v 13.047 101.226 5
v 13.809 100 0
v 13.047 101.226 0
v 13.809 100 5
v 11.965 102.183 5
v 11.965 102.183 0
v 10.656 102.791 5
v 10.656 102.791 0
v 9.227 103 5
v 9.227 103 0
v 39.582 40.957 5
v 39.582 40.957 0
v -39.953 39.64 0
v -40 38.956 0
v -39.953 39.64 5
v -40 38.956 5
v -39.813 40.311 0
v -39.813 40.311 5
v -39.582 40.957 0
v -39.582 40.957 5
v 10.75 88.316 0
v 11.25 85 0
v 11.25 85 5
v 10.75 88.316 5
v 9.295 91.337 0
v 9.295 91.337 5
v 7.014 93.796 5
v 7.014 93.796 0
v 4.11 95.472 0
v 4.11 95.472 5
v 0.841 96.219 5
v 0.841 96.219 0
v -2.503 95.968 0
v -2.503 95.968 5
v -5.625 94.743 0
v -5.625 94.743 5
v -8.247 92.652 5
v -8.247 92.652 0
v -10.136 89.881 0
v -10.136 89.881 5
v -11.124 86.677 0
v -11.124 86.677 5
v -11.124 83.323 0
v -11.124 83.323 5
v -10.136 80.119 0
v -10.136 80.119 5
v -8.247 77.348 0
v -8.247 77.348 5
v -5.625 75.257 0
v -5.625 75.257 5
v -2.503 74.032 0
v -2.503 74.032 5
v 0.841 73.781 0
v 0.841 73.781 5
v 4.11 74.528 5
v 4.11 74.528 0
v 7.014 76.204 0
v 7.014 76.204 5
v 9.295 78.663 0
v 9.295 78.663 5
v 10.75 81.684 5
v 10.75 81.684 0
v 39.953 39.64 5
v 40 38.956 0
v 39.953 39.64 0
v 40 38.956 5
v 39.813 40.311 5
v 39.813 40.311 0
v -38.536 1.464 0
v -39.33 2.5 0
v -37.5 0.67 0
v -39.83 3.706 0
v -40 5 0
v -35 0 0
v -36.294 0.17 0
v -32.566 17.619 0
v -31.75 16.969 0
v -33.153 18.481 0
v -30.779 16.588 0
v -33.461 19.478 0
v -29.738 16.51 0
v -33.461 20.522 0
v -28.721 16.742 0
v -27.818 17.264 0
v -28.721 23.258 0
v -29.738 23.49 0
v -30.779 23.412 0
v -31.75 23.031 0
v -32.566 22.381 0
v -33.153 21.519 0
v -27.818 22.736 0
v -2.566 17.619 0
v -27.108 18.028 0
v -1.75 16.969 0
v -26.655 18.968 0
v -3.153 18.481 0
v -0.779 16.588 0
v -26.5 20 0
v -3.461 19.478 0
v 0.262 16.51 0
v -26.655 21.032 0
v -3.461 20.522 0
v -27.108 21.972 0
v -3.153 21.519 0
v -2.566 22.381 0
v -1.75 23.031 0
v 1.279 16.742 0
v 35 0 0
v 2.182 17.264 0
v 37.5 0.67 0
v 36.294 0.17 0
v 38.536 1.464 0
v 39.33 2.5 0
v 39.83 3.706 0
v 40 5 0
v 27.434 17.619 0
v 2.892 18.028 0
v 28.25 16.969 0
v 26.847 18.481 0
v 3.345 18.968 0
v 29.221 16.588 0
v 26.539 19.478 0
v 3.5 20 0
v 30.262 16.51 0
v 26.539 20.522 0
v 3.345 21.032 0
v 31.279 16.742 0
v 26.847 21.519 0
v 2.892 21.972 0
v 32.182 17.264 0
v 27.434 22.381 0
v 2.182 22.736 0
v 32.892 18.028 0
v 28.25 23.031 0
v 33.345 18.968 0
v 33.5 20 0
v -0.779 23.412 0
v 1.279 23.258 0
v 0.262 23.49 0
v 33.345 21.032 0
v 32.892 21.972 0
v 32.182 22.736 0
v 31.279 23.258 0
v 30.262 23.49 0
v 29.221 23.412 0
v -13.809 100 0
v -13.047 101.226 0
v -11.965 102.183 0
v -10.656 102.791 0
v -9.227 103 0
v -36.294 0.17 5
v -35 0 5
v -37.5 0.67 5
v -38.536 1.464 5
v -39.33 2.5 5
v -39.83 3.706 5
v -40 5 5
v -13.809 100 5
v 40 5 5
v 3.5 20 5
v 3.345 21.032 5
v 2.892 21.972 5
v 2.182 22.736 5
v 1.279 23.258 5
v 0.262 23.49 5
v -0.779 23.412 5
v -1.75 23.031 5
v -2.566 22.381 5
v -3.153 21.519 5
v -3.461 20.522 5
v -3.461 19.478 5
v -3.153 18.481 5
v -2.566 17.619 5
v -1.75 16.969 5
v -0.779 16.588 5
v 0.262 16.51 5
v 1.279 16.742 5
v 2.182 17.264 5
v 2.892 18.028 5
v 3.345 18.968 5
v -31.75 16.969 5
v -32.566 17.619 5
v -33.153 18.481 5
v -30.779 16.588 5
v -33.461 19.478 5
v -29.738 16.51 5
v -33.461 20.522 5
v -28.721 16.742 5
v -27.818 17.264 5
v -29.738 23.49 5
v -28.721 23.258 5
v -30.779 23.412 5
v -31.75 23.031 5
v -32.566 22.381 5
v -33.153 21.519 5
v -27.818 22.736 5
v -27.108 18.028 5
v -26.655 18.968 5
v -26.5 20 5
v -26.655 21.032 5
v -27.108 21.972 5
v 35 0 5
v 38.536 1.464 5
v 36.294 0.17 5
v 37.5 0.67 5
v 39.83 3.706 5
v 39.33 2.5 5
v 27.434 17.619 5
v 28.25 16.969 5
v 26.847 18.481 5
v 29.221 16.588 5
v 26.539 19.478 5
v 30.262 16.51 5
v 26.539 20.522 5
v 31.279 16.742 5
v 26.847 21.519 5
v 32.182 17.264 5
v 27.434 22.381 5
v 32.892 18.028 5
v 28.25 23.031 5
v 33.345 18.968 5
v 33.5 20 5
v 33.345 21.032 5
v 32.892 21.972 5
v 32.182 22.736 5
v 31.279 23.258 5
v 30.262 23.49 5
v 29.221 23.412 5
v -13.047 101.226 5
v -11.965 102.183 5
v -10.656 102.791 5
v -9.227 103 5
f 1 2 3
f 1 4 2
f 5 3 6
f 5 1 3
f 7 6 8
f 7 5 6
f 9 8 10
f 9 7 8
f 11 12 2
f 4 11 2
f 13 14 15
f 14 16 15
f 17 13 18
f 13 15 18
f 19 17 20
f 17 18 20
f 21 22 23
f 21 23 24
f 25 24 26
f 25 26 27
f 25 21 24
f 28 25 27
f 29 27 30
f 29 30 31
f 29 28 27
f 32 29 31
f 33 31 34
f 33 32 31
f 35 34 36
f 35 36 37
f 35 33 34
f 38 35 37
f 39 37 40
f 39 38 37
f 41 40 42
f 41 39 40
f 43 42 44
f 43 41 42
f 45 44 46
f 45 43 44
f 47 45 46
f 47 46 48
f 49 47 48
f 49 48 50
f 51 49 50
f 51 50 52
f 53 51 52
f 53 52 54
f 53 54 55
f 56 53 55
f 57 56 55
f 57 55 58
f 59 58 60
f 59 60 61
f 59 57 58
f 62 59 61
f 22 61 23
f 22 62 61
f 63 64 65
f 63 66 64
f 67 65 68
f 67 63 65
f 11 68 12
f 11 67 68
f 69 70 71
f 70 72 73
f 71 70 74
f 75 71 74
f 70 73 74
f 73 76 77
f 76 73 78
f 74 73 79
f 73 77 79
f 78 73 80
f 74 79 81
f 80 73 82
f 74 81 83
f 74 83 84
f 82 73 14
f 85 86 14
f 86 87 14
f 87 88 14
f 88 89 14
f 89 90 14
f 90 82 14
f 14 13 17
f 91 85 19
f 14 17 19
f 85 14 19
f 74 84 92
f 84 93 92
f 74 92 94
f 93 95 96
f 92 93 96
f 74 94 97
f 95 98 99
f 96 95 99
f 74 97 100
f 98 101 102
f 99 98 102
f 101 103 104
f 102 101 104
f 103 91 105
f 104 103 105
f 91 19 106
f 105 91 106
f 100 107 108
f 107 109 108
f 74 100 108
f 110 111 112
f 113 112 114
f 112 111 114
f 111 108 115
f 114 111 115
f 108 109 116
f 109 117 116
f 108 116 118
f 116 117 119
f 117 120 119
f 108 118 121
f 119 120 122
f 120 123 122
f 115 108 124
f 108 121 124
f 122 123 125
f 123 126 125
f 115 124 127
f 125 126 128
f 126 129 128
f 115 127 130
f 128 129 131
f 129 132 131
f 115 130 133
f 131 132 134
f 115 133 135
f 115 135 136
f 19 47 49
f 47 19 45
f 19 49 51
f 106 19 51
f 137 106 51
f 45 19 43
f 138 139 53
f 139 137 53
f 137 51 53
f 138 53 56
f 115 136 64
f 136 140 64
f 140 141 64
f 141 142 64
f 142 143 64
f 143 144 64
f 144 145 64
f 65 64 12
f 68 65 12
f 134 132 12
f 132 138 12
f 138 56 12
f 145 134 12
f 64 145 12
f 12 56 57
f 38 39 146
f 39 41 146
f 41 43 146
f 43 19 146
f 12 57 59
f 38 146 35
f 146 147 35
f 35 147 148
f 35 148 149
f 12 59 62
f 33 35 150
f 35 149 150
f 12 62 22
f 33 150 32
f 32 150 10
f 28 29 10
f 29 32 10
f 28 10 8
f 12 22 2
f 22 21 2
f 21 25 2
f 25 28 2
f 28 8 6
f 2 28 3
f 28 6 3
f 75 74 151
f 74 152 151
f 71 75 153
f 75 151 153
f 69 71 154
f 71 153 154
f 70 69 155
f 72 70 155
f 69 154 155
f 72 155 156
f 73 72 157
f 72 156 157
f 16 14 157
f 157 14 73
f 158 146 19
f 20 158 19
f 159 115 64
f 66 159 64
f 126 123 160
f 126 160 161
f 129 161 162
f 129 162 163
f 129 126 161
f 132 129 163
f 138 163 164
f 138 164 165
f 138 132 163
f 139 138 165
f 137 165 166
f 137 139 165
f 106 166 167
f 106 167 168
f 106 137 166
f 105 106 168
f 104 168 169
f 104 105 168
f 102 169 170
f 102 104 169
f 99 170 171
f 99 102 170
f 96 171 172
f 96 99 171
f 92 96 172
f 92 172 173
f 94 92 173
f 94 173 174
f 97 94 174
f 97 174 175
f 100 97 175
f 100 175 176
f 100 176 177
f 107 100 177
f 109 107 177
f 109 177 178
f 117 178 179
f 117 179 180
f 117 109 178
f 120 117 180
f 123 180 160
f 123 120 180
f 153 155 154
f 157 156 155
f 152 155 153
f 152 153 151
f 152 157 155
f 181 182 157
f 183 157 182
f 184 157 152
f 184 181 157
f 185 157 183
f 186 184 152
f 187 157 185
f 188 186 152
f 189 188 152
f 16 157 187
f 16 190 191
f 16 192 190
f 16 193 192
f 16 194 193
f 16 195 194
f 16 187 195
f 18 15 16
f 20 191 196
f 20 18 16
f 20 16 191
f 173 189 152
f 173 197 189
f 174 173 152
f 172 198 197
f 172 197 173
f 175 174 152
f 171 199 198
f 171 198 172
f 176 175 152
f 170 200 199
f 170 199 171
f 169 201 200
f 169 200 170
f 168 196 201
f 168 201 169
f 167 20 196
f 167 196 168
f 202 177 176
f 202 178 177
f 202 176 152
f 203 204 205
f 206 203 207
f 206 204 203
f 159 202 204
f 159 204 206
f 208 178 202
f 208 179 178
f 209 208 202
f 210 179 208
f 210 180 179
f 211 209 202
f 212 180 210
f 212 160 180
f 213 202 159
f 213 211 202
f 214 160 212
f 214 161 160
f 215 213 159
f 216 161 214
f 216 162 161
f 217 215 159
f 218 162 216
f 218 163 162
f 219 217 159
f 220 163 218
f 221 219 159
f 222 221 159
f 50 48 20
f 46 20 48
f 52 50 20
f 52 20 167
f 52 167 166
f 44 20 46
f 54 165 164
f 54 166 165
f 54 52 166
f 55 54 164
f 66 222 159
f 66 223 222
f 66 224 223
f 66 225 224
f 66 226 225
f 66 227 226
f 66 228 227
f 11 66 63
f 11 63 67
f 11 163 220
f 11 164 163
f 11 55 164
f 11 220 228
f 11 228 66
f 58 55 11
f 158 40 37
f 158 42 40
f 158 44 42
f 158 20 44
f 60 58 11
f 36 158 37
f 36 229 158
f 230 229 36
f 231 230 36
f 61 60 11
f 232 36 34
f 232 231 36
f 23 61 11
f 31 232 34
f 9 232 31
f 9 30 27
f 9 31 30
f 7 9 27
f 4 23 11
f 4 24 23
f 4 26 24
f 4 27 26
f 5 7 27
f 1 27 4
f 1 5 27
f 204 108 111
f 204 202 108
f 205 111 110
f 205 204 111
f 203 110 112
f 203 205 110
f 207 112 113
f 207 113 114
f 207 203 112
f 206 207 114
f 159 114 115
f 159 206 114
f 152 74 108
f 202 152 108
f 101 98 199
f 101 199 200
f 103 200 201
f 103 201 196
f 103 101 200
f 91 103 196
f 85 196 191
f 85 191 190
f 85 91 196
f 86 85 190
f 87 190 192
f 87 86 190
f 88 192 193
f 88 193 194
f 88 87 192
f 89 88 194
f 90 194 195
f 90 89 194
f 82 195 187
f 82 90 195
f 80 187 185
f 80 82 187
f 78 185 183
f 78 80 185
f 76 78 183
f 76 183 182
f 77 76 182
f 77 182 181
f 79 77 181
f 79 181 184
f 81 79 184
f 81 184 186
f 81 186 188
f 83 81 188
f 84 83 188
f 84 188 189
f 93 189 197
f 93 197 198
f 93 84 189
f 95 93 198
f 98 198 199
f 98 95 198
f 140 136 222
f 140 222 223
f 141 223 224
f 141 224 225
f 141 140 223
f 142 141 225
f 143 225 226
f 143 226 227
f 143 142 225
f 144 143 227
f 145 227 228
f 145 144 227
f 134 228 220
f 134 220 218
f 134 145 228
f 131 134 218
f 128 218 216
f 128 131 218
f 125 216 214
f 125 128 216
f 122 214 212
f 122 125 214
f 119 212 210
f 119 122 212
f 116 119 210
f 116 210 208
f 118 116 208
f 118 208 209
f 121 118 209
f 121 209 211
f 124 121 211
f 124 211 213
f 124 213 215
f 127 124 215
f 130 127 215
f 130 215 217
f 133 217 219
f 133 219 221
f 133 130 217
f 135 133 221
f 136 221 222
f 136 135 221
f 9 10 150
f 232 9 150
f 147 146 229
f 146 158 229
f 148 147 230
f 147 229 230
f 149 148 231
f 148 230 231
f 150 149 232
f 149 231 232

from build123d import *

# Parameters (mm, degrees)
ESQUISSE1_R        = 11.25
ESQUISSE1_R_2      = 3.5
BOSS_EXTRU_1_DEPTH = 5
CONG_1_R           = 5


with BuildPart() as part:
    # Esquisse1 → Boss.-Extru.1 (new body)
    with BuildSketch(Plane.XY):
        Polygon((-40, 0), (40, 0), (40, 40), (12.5, 103), (-12.5, 103), (-40, 40), align=None)
        with Locations((0, 85)):
            Circle(ESQUISSE1_R, mode=Mode.SUBTRACT)
        with Locations((0, 20)):
            Circle(ESQUISSE1_R_2, mode=Mode.SUBTRACT)
        with Locations((30, 20)):
            Circle(ESQUISSE1_R_2, mode=Mode.SUBTRACT)
        with Locations((-30, 20)):
            Circle(ESQUISSE1_R_2, mode=Mode.SUBTRACT)
    extrude(amount=BOSS_EXTRU_1_DEPTH)

    # Congé1
    cong_1_edges = [part.edges().sort_by_distance(p)[0] for p in [
        (-12.5, 103, 2.5),
        (12.5, 103, 2.5),
        (40, 40, 2.5),
        (40, 0, 2.5),
        (-40, 0, 2.5),
        (-40, 40, 2.5),
    ]]
    fillet(cong_1_edges, radius=CONG_1_R)


solid = part.part
